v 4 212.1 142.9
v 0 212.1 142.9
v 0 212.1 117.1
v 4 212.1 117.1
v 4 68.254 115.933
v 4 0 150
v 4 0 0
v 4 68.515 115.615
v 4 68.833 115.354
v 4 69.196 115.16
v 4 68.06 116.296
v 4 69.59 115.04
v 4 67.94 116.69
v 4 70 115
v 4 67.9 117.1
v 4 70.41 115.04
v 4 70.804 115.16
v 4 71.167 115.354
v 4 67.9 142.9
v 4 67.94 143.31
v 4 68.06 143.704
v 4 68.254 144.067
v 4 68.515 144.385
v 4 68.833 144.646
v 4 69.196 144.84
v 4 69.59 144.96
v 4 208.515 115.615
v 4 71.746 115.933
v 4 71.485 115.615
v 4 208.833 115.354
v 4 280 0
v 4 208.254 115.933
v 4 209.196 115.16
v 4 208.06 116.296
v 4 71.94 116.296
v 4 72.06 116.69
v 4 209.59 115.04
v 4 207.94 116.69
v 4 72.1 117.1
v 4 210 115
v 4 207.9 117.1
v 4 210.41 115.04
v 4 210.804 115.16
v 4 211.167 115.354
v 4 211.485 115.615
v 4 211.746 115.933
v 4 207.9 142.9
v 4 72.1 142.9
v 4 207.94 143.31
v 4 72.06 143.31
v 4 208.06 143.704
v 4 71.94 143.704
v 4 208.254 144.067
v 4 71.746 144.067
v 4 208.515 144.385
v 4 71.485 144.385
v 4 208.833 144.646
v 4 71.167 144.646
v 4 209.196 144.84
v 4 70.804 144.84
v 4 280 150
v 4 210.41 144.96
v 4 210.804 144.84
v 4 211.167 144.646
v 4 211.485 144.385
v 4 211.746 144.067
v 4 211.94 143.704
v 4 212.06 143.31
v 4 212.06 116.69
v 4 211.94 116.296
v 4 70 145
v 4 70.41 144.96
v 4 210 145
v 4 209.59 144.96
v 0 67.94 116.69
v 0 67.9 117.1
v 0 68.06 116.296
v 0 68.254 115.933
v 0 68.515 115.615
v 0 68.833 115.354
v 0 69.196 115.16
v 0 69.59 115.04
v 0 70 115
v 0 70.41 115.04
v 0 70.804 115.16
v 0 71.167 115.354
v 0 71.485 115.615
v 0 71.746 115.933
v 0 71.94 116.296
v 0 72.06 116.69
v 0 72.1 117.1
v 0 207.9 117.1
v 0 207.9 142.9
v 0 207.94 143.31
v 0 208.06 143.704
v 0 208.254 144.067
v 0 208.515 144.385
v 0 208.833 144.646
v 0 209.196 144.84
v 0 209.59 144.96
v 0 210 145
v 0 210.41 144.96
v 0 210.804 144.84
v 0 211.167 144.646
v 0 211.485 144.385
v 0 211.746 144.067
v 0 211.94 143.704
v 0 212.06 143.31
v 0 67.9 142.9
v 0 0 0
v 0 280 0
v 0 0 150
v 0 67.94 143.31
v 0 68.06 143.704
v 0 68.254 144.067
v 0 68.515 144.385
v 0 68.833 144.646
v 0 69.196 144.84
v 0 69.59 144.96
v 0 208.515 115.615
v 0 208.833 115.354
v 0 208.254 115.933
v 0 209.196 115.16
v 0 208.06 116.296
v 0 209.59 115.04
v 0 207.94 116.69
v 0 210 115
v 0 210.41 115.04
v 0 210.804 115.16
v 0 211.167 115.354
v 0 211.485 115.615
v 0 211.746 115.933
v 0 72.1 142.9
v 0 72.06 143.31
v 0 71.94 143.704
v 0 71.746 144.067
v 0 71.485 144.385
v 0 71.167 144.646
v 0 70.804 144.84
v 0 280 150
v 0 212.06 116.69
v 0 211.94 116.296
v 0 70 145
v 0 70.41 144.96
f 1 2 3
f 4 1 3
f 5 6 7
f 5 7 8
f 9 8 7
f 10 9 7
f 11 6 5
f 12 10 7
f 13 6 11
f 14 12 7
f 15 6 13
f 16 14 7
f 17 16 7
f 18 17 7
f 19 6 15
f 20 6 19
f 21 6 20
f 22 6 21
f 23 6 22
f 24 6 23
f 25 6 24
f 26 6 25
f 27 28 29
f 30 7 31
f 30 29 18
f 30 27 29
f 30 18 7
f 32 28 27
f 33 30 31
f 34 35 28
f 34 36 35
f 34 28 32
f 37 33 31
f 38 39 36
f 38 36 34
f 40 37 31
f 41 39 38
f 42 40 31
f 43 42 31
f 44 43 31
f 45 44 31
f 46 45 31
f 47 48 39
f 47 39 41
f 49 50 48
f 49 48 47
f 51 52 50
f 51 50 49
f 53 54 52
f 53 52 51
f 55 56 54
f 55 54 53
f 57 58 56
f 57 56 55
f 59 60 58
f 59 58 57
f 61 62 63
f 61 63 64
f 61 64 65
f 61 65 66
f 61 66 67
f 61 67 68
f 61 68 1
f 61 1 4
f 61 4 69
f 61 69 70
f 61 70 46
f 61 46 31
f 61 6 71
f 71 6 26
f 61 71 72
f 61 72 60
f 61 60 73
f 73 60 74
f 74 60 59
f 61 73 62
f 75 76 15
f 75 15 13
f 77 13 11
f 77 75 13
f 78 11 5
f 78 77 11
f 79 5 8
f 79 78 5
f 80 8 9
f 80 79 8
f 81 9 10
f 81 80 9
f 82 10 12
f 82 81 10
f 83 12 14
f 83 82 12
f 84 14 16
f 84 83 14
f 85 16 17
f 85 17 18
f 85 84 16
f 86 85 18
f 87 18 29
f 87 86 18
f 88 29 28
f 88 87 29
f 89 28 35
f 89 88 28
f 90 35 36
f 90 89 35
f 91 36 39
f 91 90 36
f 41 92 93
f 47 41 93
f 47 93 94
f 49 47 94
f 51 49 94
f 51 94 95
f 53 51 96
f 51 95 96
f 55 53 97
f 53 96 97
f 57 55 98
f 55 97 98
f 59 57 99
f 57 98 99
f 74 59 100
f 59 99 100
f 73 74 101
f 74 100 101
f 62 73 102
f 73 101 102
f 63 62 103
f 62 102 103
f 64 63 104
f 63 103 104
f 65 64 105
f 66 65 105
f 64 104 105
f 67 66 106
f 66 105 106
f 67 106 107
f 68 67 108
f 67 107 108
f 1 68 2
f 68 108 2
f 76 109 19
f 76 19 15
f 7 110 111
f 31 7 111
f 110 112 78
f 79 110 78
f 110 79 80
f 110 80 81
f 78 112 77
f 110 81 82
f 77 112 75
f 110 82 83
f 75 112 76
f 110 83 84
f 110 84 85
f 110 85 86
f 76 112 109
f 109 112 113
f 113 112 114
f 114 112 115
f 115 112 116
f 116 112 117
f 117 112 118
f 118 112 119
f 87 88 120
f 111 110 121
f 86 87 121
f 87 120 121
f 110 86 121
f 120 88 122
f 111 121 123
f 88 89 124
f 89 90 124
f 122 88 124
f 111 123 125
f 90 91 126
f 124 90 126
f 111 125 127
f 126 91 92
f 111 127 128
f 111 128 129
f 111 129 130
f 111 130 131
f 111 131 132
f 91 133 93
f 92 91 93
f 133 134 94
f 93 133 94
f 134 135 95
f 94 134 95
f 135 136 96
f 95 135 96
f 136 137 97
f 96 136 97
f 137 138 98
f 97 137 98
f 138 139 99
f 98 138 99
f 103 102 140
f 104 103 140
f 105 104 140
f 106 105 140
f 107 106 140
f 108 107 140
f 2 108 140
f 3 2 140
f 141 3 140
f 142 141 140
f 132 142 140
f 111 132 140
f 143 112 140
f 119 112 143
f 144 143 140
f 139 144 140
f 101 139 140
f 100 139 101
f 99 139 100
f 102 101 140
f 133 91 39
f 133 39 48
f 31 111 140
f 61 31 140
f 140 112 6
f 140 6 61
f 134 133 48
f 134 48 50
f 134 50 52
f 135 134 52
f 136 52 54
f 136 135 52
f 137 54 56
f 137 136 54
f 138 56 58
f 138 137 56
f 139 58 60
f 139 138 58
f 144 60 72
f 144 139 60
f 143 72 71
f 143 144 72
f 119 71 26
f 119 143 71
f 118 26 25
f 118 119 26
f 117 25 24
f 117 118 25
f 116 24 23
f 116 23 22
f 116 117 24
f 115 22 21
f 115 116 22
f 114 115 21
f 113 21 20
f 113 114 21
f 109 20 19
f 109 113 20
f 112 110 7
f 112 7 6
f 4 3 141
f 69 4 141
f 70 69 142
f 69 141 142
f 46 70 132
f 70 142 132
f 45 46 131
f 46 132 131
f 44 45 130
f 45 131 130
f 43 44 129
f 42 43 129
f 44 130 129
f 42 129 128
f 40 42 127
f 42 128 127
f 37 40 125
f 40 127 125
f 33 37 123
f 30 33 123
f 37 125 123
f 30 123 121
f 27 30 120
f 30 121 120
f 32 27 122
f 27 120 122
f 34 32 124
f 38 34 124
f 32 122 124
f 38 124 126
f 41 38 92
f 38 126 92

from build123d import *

# Parameters (mm, degrees)
SKETCH1_W           = 280
SKETCH1_H           = 150
BOSS_EXTRUDE1_DEPTH = 4


with BuildPart() as part:
    # Sketch1 → Boss-Extrude1 (new body)
    with BuildSketch(Plane.YZ):
        with Locations((140, 75)):
            Rectangle(SKETCH1_W, SKETCH1_H)
        with BuildLine():
            Line((67.9, 142.9), (67.9, 117.1))
            ThreePointArc((67.9, 117.1), (70, 115), (72.1, 117.1))
            Line((72.1, 117.1), (72.1, 142.9))
            ThreePointArc((72.1, 142.9), (70, 145), (67.9, 142.9))
        make_face(mode=Mode.SUBTRACT)
        with BuildLine():
            Line((212.1, 142.9), (212.1, 117.1))
            ThreePointArc((212.1, 117.1), (210, 115), (207.9, 117.1))
            Line((207.9, 117.1), (207.9, 142.9))
            ThreePointArc((207.9, 142.9), (210, 145), (212.1, 142.9))
        make_face(mode=Mode.SUBTRACT)
    extrude(amount=BOSS_EXTRUDE1_DEPTH)


solid = part.part
